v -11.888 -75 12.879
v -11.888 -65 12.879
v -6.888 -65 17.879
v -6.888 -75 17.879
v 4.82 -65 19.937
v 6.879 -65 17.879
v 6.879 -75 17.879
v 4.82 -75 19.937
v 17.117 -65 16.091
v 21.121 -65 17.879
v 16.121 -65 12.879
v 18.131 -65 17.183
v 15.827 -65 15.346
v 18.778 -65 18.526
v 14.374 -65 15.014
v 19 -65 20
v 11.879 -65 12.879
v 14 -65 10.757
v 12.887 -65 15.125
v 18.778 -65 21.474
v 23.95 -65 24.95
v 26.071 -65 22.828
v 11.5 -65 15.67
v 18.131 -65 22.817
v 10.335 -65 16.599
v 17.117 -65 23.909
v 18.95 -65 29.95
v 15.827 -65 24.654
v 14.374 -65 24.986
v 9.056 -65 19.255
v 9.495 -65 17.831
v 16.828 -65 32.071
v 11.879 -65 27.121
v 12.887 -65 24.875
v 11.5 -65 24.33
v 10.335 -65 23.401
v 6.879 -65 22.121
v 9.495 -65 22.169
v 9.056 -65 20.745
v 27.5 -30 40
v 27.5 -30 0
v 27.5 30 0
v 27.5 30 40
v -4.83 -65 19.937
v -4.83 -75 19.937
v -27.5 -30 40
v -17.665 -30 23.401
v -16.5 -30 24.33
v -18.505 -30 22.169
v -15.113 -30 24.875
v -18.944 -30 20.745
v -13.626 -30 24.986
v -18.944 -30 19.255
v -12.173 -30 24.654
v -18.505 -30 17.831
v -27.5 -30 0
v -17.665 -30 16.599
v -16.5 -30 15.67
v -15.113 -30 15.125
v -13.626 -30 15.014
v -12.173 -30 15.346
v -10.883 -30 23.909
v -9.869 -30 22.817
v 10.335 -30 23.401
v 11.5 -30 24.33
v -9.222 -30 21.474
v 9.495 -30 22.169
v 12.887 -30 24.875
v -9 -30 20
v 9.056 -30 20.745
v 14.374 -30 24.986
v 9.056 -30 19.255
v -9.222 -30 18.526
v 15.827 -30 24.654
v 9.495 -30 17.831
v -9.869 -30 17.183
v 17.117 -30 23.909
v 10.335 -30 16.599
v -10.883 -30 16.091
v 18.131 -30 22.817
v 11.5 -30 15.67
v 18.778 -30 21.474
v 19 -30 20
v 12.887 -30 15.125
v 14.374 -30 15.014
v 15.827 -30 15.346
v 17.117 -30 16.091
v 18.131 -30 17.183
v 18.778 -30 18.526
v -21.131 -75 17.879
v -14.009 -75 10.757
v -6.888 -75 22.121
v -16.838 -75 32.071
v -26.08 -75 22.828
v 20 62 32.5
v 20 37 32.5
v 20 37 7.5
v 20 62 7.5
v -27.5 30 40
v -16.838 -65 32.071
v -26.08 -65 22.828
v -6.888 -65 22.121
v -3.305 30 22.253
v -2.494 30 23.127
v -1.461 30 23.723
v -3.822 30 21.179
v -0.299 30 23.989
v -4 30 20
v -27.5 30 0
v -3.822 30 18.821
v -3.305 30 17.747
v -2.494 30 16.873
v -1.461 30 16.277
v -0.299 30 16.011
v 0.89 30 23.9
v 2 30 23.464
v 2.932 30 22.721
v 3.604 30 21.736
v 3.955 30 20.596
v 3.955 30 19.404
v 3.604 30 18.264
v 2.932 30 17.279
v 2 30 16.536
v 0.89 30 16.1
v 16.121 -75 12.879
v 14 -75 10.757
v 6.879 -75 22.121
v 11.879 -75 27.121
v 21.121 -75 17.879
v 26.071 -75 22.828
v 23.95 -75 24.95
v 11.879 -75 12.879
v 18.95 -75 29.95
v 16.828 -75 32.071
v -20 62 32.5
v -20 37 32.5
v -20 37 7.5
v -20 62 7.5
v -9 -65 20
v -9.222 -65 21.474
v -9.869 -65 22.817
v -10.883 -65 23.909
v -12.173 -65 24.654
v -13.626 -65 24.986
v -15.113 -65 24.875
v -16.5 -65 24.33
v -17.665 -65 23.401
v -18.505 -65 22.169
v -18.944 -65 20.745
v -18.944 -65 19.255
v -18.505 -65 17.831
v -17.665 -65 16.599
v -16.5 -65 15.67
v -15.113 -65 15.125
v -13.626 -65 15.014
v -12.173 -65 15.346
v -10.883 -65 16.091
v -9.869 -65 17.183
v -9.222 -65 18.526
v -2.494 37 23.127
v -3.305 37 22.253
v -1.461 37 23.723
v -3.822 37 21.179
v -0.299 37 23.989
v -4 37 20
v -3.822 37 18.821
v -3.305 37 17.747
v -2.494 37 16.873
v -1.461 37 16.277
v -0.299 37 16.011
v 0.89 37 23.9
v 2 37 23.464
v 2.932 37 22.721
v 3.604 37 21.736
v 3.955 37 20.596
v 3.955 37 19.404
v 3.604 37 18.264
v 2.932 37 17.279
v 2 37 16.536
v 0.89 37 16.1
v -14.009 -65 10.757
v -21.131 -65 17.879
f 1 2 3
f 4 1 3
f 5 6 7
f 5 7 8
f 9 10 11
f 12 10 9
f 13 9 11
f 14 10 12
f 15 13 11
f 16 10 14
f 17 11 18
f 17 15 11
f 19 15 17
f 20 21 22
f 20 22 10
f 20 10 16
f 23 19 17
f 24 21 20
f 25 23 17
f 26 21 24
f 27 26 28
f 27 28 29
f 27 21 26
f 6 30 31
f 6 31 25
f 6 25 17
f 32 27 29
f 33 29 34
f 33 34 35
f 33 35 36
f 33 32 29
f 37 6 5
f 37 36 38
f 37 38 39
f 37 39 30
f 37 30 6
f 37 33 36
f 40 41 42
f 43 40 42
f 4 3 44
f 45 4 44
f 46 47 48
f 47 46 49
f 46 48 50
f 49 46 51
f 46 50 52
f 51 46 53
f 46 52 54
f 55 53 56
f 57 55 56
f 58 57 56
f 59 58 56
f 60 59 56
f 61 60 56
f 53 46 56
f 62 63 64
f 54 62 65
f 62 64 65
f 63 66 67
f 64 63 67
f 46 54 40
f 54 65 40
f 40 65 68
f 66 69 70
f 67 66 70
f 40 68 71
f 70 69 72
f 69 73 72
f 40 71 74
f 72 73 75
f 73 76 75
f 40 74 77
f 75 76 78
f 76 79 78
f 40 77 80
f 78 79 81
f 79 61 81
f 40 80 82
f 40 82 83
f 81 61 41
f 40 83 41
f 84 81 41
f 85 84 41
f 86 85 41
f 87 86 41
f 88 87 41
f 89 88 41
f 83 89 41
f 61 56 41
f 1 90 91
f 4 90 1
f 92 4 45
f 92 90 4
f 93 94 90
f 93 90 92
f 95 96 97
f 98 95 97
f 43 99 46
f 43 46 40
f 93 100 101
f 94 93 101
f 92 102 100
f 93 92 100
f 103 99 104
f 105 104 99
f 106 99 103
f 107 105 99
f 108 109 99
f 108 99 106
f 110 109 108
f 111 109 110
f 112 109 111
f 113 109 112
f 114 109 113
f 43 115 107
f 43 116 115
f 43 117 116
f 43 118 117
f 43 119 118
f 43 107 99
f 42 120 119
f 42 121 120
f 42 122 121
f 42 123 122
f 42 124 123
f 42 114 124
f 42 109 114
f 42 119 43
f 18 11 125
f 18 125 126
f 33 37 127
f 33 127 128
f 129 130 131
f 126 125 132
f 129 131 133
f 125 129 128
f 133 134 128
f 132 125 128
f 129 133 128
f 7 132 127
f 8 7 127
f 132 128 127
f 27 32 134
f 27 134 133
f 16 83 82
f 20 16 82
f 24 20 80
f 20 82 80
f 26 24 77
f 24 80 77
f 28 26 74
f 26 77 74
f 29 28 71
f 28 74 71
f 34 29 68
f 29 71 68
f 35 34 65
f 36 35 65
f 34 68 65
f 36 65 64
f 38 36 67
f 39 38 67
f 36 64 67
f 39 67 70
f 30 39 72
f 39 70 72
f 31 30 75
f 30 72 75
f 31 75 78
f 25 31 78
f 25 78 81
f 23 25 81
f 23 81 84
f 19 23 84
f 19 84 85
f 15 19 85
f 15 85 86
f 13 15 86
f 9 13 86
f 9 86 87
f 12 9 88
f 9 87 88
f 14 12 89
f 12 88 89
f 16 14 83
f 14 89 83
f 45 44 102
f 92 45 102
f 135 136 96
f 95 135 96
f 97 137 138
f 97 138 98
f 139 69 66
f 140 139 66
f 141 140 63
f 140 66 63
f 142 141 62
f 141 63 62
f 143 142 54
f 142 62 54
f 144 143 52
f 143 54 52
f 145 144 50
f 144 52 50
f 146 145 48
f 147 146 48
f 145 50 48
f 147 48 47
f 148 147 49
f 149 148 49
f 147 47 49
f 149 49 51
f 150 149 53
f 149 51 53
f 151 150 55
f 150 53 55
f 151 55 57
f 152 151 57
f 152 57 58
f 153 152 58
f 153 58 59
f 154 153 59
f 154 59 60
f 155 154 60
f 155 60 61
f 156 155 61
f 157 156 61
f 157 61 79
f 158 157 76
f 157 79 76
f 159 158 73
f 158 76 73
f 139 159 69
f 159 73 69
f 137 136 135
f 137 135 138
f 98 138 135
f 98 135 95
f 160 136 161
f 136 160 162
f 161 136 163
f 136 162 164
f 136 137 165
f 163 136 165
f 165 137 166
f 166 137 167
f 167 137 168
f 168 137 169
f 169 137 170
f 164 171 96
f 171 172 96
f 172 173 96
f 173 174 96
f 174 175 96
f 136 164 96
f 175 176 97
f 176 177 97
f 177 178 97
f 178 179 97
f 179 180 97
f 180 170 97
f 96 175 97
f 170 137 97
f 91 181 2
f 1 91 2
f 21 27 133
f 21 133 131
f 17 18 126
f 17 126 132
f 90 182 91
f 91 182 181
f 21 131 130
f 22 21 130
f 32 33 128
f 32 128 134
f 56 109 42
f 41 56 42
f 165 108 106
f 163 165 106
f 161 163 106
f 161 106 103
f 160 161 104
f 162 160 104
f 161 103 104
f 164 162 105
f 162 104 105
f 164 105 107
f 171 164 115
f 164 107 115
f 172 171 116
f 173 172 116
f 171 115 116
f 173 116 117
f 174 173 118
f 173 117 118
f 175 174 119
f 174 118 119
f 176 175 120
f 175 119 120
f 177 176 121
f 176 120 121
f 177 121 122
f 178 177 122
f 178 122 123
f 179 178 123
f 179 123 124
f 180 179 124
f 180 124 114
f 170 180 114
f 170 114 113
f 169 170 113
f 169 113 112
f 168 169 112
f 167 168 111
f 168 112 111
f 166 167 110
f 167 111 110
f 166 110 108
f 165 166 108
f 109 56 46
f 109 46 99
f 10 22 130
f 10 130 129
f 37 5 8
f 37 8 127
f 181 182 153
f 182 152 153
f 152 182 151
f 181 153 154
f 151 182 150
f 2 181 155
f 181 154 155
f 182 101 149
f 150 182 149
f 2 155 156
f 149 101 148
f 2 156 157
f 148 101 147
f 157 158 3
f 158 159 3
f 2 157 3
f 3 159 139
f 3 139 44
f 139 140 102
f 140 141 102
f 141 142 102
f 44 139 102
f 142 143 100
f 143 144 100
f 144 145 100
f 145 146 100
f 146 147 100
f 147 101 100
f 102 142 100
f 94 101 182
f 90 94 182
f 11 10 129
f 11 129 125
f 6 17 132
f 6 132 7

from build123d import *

# Parameters (mm, degrees)
SKETCH1_W           = 55
SKETCH1_H           = 60
BOSS_EXTRUDE1_DEPTH = 40
SKETCH2_R           = 4
BOSS_EXTRUDE2_DEPTH = 7
SKETCH4_W           = 40
SKETCH4_H           = 25
BOSS_EXTRUDE3_DEPTH = 25
SKETCH5_R           = 5
BOSS_EXTRUDE4_DEPTH = 35
BOSS_EXTRUDE5_DEPTH = 10


with BuildPart() as part:
    # Sketch1 → Boss-Extrude1 (new body)
    with BuildSketch(Plane.XY):
        Rectangle(SKETCH1_W, SKETCH1_H)
    extrude(amount=BOSS_EXTRUDE1_DEPTH)

    # Sketch2 → Boss-Extrude2 (add)
    with BuildSketch(Plane(origin=(0, 30, 0), x_dir=(-1, 0, 0), z_dir=(0, 1, 0))):
        with Locations((0, 20)):
            Circle(SKETCH2_R)
    extrude(amount=BOSS_EXTRUDE2_DEPTH)

    # Sketch4 → Boss-Extrude3 (add)
    with BuildSketch(Plane(origin=(0, 37, 0), x_dir=(1, 0, 0), z_dir=(0, 1, 0))):
        with Locations((0, -20)):
            Rectangle(SKETCH4_W, SKETCH4_H)
    extrude(amount=BOSS_EXTRUDE3_DEPTH)

    # Sketch5 → Boss-Extrude4 (add)
    with BuildSketch(Plane.XZ.offset(30)):
        with Locations((-14, 20)):
            Circle(SKETCH5_R)
        with Locations((14, 20)):
            Circle(SKETCH5_R)
    extrude(amount=BOSS_EXTRUDE4_DEPTH)

    # Sketch6 → Boss-Extrude5 (add)
    with BuildSketch(Plane.XZ.offset(65)):
        Polygon((-11.888014897, 12.878679656), (-6.888014897, 17.878679656), (-4.829546686, 19.937147868), (-6.888014897, 22.121320344), (-11.888014897, 27.121320344), (-16.837762365, 32.071067812), (-18.959082709, 29.949747468), (-23.959082709, 24.949747468), (-26.080403052, 22.828427125), (-21.130655584, 17.878679656), (-16.130655584, 12.878679656), (-14.009335241, 10.757359313), align=None)
        Polygon((18.949747468, 29.949747468), (23.949747468, 24.949747468), (26.071067812, 22.828427125), (21.121320344, 17.878679656), (16.121320344, 12.878679656), (14, 10.757359313), (11.878679656, 12.878679656), (6.878679656, 17.878679656), (4.820211445, 19.937147868), (6.878679656, 22.121320344), (11.878679656, 27.121320344), (16.828427125, 32.071067812), align=None)
    extrude(amount=BOSS_EXTRUDE5_DEPTH)


solid = part.part
